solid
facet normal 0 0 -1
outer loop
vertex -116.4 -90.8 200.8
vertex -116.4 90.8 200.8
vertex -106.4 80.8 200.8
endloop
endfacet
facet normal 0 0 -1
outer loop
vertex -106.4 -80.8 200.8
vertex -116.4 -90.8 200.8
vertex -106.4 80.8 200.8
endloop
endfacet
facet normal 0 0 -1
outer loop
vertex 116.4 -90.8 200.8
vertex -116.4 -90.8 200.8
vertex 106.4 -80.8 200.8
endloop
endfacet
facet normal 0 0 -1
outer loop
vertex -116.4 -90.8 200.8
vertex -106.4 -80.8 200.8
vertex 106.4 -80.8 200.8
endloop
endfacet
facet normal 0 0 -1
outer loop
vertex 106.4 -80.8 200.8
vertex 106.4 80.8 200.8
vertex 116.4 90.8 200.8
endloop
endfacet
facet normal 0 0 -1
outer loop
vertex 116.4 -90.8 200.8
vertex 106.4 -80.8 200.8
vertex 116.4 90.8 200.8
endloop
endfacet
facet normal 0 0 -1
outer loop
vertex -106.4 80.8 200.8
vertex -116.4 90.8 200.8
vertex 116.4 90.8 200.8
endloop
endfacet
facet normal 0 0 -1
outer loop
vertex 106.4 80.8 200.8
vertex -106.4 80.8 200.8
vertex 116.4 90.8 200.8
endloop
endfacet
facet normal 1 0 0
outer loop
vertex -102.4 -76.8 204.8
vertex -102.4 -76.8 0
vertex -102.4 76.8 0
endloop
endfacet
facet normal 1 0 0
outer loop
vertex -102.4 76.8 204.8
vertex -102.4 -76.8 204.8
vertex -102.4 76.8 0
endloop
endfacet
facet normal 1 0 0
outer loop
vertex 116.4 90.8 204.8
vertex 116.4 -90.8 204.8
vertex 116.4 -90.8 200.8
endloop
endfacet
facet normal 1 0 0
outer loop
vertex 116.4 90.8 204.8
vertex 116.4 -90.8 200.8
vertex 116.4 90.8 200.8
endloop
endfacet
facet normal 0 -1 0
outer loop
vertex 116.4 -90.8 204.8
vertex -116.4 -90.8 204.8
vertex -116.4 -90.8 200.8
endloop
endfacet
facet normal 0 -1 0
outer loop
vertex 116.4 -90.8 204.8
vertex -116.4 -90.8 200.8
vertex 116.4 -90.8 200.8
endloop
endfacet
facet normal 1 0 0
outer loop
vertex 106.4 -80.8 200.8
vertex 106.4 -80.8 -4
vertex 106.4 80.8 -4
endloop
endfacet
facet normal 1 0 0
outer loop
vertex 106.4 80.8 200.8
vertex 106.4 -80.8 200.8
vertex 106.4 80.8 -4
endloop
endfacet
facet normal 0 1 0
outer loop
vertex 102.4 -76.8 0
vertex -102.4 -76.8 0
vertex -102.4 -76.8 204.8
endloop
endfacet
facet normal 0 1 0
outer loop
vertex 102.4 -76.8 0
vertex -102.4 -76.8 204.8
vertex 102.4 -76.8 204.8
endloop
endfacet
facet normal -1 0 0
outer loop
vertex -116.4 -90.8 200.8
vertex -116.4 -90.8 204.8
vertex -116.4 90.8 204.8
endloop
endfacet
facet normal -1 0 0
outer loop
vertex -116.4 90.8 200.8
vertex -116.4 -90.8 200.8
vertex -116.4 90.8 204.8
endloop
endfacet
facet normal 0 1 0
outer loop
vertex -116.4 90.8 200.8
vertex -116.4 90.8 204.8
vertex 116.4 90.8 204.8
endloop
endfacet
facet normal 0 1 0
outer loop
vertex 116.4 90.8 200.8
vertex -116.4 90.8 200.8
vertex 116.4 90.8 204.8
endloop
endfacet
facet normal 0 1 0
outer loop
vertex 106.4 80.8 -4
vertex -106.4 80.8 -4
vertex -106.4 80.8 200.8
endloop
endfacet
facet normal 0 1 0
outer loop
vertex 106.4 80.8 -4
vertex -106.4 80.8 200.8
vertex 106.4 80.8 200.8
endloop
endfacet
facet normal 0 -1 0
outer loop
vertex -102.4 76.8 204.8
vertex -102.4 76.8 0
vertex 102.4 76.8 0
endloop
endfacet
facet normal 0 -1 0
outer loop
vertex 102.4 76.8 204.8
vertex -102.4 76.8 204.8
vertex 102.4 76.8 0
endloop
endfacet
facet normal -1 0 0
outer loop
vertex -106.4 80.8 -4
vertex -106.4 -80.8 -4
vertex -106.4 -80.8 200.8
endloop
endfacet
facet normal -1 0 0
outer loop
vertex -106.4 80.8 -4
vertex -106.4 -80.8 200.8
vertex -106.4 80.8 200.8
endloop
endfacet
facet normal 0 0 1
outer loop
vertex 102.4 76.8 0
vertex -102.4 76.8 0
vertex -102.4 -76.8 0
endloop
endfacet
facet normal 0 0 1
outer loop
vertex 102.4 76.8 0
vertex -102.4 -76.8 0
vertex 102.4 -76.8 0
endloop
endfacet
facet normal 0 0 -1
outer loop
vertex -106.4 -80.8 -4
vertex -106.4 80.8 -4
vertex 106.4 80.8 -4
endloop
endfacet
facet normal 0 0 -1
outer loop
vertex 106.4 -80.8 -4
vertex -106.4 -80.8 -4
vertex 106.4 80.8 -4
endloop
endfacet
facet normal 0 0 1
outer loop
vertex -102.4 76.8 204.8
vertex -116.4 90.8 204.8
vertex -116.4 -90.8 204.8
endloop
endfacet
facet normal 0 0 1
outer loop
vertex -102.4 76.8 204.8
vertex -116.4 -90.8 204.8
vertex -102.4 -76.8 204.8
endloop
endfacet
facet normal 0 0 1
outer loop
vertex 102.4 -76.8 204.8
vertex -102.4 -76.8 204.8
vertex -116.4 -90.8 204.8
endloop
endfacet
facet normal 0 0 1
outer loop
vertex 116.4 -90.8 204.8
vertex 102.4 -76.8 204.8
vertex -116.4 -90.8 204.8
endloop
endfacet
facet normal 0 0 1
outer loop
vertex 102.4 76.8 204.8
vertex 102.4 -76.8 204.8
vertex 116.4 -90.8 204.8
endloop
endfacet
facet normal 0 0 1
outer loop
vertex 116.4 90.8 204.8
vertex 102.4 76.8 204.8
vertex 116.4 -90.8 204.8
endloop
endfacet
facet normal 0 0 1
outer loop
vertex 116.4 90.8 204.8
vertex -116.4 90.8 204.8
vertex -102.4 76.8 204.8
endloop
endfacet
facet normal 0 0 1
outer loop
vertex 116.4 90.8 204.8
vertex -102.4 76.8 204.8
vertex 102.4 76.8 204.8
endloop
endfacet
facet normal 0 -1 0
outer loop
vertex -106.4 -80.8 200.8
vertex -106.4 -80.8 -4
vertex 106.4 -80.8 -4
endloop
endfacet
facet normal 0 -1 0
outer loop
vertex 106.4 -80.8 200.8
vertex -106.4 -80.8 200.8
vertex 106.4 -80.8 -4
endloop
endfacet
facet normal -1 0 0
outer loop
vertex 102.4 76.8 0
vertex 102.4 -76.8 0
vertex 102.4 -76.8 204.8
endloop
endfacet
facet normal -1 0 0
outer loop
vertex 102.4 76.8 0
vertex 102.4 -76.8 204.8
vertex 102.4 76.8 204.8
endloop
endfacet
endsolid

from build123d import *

# Parameters (mm, degrees)
SKETCH_W      = 204.8
SKETCH_H      = 153.6
PAD_DEPTH     = 204.8
THICKNESS_T   = 4
SKETCH001_W   = 232.8
SKETCH001_H   = 181.6
SKETCH001_W_2 = 212.8
SKETCH001_H_2 = 161.6
PAD001_DEPTH  = 4


with BuildPart() as part:
    # Sketch → Pad (new body)
    with BuildSketch(Plane.XY):
        Rectangle(SKETCH_W, SKETCH_H)
    extrude(amount=PAD_DEPTH)

    # Thickness
    thickness_openings = [part.faces().sort_by_distance(p)[0] for p in [
        (0, 0, 204.8),
    ]]
    offset(amount=THICKNESS_T, openings=thickness_openings, kind=Kind.INTERSECTION)

    # Sketch001 → Pad001 (new body)
    with BuildSketch(Plane.XY.offset(204.8)):
        Rectangle(SKETCH001_W, SKETCH001_H)
        Rectangle(SKETCH001_W_2, SKETCH001_H_2, mode=Mode.SUBTRACT)
    extrude(amount=-PAD001_DEPTH)


solid = part.part
